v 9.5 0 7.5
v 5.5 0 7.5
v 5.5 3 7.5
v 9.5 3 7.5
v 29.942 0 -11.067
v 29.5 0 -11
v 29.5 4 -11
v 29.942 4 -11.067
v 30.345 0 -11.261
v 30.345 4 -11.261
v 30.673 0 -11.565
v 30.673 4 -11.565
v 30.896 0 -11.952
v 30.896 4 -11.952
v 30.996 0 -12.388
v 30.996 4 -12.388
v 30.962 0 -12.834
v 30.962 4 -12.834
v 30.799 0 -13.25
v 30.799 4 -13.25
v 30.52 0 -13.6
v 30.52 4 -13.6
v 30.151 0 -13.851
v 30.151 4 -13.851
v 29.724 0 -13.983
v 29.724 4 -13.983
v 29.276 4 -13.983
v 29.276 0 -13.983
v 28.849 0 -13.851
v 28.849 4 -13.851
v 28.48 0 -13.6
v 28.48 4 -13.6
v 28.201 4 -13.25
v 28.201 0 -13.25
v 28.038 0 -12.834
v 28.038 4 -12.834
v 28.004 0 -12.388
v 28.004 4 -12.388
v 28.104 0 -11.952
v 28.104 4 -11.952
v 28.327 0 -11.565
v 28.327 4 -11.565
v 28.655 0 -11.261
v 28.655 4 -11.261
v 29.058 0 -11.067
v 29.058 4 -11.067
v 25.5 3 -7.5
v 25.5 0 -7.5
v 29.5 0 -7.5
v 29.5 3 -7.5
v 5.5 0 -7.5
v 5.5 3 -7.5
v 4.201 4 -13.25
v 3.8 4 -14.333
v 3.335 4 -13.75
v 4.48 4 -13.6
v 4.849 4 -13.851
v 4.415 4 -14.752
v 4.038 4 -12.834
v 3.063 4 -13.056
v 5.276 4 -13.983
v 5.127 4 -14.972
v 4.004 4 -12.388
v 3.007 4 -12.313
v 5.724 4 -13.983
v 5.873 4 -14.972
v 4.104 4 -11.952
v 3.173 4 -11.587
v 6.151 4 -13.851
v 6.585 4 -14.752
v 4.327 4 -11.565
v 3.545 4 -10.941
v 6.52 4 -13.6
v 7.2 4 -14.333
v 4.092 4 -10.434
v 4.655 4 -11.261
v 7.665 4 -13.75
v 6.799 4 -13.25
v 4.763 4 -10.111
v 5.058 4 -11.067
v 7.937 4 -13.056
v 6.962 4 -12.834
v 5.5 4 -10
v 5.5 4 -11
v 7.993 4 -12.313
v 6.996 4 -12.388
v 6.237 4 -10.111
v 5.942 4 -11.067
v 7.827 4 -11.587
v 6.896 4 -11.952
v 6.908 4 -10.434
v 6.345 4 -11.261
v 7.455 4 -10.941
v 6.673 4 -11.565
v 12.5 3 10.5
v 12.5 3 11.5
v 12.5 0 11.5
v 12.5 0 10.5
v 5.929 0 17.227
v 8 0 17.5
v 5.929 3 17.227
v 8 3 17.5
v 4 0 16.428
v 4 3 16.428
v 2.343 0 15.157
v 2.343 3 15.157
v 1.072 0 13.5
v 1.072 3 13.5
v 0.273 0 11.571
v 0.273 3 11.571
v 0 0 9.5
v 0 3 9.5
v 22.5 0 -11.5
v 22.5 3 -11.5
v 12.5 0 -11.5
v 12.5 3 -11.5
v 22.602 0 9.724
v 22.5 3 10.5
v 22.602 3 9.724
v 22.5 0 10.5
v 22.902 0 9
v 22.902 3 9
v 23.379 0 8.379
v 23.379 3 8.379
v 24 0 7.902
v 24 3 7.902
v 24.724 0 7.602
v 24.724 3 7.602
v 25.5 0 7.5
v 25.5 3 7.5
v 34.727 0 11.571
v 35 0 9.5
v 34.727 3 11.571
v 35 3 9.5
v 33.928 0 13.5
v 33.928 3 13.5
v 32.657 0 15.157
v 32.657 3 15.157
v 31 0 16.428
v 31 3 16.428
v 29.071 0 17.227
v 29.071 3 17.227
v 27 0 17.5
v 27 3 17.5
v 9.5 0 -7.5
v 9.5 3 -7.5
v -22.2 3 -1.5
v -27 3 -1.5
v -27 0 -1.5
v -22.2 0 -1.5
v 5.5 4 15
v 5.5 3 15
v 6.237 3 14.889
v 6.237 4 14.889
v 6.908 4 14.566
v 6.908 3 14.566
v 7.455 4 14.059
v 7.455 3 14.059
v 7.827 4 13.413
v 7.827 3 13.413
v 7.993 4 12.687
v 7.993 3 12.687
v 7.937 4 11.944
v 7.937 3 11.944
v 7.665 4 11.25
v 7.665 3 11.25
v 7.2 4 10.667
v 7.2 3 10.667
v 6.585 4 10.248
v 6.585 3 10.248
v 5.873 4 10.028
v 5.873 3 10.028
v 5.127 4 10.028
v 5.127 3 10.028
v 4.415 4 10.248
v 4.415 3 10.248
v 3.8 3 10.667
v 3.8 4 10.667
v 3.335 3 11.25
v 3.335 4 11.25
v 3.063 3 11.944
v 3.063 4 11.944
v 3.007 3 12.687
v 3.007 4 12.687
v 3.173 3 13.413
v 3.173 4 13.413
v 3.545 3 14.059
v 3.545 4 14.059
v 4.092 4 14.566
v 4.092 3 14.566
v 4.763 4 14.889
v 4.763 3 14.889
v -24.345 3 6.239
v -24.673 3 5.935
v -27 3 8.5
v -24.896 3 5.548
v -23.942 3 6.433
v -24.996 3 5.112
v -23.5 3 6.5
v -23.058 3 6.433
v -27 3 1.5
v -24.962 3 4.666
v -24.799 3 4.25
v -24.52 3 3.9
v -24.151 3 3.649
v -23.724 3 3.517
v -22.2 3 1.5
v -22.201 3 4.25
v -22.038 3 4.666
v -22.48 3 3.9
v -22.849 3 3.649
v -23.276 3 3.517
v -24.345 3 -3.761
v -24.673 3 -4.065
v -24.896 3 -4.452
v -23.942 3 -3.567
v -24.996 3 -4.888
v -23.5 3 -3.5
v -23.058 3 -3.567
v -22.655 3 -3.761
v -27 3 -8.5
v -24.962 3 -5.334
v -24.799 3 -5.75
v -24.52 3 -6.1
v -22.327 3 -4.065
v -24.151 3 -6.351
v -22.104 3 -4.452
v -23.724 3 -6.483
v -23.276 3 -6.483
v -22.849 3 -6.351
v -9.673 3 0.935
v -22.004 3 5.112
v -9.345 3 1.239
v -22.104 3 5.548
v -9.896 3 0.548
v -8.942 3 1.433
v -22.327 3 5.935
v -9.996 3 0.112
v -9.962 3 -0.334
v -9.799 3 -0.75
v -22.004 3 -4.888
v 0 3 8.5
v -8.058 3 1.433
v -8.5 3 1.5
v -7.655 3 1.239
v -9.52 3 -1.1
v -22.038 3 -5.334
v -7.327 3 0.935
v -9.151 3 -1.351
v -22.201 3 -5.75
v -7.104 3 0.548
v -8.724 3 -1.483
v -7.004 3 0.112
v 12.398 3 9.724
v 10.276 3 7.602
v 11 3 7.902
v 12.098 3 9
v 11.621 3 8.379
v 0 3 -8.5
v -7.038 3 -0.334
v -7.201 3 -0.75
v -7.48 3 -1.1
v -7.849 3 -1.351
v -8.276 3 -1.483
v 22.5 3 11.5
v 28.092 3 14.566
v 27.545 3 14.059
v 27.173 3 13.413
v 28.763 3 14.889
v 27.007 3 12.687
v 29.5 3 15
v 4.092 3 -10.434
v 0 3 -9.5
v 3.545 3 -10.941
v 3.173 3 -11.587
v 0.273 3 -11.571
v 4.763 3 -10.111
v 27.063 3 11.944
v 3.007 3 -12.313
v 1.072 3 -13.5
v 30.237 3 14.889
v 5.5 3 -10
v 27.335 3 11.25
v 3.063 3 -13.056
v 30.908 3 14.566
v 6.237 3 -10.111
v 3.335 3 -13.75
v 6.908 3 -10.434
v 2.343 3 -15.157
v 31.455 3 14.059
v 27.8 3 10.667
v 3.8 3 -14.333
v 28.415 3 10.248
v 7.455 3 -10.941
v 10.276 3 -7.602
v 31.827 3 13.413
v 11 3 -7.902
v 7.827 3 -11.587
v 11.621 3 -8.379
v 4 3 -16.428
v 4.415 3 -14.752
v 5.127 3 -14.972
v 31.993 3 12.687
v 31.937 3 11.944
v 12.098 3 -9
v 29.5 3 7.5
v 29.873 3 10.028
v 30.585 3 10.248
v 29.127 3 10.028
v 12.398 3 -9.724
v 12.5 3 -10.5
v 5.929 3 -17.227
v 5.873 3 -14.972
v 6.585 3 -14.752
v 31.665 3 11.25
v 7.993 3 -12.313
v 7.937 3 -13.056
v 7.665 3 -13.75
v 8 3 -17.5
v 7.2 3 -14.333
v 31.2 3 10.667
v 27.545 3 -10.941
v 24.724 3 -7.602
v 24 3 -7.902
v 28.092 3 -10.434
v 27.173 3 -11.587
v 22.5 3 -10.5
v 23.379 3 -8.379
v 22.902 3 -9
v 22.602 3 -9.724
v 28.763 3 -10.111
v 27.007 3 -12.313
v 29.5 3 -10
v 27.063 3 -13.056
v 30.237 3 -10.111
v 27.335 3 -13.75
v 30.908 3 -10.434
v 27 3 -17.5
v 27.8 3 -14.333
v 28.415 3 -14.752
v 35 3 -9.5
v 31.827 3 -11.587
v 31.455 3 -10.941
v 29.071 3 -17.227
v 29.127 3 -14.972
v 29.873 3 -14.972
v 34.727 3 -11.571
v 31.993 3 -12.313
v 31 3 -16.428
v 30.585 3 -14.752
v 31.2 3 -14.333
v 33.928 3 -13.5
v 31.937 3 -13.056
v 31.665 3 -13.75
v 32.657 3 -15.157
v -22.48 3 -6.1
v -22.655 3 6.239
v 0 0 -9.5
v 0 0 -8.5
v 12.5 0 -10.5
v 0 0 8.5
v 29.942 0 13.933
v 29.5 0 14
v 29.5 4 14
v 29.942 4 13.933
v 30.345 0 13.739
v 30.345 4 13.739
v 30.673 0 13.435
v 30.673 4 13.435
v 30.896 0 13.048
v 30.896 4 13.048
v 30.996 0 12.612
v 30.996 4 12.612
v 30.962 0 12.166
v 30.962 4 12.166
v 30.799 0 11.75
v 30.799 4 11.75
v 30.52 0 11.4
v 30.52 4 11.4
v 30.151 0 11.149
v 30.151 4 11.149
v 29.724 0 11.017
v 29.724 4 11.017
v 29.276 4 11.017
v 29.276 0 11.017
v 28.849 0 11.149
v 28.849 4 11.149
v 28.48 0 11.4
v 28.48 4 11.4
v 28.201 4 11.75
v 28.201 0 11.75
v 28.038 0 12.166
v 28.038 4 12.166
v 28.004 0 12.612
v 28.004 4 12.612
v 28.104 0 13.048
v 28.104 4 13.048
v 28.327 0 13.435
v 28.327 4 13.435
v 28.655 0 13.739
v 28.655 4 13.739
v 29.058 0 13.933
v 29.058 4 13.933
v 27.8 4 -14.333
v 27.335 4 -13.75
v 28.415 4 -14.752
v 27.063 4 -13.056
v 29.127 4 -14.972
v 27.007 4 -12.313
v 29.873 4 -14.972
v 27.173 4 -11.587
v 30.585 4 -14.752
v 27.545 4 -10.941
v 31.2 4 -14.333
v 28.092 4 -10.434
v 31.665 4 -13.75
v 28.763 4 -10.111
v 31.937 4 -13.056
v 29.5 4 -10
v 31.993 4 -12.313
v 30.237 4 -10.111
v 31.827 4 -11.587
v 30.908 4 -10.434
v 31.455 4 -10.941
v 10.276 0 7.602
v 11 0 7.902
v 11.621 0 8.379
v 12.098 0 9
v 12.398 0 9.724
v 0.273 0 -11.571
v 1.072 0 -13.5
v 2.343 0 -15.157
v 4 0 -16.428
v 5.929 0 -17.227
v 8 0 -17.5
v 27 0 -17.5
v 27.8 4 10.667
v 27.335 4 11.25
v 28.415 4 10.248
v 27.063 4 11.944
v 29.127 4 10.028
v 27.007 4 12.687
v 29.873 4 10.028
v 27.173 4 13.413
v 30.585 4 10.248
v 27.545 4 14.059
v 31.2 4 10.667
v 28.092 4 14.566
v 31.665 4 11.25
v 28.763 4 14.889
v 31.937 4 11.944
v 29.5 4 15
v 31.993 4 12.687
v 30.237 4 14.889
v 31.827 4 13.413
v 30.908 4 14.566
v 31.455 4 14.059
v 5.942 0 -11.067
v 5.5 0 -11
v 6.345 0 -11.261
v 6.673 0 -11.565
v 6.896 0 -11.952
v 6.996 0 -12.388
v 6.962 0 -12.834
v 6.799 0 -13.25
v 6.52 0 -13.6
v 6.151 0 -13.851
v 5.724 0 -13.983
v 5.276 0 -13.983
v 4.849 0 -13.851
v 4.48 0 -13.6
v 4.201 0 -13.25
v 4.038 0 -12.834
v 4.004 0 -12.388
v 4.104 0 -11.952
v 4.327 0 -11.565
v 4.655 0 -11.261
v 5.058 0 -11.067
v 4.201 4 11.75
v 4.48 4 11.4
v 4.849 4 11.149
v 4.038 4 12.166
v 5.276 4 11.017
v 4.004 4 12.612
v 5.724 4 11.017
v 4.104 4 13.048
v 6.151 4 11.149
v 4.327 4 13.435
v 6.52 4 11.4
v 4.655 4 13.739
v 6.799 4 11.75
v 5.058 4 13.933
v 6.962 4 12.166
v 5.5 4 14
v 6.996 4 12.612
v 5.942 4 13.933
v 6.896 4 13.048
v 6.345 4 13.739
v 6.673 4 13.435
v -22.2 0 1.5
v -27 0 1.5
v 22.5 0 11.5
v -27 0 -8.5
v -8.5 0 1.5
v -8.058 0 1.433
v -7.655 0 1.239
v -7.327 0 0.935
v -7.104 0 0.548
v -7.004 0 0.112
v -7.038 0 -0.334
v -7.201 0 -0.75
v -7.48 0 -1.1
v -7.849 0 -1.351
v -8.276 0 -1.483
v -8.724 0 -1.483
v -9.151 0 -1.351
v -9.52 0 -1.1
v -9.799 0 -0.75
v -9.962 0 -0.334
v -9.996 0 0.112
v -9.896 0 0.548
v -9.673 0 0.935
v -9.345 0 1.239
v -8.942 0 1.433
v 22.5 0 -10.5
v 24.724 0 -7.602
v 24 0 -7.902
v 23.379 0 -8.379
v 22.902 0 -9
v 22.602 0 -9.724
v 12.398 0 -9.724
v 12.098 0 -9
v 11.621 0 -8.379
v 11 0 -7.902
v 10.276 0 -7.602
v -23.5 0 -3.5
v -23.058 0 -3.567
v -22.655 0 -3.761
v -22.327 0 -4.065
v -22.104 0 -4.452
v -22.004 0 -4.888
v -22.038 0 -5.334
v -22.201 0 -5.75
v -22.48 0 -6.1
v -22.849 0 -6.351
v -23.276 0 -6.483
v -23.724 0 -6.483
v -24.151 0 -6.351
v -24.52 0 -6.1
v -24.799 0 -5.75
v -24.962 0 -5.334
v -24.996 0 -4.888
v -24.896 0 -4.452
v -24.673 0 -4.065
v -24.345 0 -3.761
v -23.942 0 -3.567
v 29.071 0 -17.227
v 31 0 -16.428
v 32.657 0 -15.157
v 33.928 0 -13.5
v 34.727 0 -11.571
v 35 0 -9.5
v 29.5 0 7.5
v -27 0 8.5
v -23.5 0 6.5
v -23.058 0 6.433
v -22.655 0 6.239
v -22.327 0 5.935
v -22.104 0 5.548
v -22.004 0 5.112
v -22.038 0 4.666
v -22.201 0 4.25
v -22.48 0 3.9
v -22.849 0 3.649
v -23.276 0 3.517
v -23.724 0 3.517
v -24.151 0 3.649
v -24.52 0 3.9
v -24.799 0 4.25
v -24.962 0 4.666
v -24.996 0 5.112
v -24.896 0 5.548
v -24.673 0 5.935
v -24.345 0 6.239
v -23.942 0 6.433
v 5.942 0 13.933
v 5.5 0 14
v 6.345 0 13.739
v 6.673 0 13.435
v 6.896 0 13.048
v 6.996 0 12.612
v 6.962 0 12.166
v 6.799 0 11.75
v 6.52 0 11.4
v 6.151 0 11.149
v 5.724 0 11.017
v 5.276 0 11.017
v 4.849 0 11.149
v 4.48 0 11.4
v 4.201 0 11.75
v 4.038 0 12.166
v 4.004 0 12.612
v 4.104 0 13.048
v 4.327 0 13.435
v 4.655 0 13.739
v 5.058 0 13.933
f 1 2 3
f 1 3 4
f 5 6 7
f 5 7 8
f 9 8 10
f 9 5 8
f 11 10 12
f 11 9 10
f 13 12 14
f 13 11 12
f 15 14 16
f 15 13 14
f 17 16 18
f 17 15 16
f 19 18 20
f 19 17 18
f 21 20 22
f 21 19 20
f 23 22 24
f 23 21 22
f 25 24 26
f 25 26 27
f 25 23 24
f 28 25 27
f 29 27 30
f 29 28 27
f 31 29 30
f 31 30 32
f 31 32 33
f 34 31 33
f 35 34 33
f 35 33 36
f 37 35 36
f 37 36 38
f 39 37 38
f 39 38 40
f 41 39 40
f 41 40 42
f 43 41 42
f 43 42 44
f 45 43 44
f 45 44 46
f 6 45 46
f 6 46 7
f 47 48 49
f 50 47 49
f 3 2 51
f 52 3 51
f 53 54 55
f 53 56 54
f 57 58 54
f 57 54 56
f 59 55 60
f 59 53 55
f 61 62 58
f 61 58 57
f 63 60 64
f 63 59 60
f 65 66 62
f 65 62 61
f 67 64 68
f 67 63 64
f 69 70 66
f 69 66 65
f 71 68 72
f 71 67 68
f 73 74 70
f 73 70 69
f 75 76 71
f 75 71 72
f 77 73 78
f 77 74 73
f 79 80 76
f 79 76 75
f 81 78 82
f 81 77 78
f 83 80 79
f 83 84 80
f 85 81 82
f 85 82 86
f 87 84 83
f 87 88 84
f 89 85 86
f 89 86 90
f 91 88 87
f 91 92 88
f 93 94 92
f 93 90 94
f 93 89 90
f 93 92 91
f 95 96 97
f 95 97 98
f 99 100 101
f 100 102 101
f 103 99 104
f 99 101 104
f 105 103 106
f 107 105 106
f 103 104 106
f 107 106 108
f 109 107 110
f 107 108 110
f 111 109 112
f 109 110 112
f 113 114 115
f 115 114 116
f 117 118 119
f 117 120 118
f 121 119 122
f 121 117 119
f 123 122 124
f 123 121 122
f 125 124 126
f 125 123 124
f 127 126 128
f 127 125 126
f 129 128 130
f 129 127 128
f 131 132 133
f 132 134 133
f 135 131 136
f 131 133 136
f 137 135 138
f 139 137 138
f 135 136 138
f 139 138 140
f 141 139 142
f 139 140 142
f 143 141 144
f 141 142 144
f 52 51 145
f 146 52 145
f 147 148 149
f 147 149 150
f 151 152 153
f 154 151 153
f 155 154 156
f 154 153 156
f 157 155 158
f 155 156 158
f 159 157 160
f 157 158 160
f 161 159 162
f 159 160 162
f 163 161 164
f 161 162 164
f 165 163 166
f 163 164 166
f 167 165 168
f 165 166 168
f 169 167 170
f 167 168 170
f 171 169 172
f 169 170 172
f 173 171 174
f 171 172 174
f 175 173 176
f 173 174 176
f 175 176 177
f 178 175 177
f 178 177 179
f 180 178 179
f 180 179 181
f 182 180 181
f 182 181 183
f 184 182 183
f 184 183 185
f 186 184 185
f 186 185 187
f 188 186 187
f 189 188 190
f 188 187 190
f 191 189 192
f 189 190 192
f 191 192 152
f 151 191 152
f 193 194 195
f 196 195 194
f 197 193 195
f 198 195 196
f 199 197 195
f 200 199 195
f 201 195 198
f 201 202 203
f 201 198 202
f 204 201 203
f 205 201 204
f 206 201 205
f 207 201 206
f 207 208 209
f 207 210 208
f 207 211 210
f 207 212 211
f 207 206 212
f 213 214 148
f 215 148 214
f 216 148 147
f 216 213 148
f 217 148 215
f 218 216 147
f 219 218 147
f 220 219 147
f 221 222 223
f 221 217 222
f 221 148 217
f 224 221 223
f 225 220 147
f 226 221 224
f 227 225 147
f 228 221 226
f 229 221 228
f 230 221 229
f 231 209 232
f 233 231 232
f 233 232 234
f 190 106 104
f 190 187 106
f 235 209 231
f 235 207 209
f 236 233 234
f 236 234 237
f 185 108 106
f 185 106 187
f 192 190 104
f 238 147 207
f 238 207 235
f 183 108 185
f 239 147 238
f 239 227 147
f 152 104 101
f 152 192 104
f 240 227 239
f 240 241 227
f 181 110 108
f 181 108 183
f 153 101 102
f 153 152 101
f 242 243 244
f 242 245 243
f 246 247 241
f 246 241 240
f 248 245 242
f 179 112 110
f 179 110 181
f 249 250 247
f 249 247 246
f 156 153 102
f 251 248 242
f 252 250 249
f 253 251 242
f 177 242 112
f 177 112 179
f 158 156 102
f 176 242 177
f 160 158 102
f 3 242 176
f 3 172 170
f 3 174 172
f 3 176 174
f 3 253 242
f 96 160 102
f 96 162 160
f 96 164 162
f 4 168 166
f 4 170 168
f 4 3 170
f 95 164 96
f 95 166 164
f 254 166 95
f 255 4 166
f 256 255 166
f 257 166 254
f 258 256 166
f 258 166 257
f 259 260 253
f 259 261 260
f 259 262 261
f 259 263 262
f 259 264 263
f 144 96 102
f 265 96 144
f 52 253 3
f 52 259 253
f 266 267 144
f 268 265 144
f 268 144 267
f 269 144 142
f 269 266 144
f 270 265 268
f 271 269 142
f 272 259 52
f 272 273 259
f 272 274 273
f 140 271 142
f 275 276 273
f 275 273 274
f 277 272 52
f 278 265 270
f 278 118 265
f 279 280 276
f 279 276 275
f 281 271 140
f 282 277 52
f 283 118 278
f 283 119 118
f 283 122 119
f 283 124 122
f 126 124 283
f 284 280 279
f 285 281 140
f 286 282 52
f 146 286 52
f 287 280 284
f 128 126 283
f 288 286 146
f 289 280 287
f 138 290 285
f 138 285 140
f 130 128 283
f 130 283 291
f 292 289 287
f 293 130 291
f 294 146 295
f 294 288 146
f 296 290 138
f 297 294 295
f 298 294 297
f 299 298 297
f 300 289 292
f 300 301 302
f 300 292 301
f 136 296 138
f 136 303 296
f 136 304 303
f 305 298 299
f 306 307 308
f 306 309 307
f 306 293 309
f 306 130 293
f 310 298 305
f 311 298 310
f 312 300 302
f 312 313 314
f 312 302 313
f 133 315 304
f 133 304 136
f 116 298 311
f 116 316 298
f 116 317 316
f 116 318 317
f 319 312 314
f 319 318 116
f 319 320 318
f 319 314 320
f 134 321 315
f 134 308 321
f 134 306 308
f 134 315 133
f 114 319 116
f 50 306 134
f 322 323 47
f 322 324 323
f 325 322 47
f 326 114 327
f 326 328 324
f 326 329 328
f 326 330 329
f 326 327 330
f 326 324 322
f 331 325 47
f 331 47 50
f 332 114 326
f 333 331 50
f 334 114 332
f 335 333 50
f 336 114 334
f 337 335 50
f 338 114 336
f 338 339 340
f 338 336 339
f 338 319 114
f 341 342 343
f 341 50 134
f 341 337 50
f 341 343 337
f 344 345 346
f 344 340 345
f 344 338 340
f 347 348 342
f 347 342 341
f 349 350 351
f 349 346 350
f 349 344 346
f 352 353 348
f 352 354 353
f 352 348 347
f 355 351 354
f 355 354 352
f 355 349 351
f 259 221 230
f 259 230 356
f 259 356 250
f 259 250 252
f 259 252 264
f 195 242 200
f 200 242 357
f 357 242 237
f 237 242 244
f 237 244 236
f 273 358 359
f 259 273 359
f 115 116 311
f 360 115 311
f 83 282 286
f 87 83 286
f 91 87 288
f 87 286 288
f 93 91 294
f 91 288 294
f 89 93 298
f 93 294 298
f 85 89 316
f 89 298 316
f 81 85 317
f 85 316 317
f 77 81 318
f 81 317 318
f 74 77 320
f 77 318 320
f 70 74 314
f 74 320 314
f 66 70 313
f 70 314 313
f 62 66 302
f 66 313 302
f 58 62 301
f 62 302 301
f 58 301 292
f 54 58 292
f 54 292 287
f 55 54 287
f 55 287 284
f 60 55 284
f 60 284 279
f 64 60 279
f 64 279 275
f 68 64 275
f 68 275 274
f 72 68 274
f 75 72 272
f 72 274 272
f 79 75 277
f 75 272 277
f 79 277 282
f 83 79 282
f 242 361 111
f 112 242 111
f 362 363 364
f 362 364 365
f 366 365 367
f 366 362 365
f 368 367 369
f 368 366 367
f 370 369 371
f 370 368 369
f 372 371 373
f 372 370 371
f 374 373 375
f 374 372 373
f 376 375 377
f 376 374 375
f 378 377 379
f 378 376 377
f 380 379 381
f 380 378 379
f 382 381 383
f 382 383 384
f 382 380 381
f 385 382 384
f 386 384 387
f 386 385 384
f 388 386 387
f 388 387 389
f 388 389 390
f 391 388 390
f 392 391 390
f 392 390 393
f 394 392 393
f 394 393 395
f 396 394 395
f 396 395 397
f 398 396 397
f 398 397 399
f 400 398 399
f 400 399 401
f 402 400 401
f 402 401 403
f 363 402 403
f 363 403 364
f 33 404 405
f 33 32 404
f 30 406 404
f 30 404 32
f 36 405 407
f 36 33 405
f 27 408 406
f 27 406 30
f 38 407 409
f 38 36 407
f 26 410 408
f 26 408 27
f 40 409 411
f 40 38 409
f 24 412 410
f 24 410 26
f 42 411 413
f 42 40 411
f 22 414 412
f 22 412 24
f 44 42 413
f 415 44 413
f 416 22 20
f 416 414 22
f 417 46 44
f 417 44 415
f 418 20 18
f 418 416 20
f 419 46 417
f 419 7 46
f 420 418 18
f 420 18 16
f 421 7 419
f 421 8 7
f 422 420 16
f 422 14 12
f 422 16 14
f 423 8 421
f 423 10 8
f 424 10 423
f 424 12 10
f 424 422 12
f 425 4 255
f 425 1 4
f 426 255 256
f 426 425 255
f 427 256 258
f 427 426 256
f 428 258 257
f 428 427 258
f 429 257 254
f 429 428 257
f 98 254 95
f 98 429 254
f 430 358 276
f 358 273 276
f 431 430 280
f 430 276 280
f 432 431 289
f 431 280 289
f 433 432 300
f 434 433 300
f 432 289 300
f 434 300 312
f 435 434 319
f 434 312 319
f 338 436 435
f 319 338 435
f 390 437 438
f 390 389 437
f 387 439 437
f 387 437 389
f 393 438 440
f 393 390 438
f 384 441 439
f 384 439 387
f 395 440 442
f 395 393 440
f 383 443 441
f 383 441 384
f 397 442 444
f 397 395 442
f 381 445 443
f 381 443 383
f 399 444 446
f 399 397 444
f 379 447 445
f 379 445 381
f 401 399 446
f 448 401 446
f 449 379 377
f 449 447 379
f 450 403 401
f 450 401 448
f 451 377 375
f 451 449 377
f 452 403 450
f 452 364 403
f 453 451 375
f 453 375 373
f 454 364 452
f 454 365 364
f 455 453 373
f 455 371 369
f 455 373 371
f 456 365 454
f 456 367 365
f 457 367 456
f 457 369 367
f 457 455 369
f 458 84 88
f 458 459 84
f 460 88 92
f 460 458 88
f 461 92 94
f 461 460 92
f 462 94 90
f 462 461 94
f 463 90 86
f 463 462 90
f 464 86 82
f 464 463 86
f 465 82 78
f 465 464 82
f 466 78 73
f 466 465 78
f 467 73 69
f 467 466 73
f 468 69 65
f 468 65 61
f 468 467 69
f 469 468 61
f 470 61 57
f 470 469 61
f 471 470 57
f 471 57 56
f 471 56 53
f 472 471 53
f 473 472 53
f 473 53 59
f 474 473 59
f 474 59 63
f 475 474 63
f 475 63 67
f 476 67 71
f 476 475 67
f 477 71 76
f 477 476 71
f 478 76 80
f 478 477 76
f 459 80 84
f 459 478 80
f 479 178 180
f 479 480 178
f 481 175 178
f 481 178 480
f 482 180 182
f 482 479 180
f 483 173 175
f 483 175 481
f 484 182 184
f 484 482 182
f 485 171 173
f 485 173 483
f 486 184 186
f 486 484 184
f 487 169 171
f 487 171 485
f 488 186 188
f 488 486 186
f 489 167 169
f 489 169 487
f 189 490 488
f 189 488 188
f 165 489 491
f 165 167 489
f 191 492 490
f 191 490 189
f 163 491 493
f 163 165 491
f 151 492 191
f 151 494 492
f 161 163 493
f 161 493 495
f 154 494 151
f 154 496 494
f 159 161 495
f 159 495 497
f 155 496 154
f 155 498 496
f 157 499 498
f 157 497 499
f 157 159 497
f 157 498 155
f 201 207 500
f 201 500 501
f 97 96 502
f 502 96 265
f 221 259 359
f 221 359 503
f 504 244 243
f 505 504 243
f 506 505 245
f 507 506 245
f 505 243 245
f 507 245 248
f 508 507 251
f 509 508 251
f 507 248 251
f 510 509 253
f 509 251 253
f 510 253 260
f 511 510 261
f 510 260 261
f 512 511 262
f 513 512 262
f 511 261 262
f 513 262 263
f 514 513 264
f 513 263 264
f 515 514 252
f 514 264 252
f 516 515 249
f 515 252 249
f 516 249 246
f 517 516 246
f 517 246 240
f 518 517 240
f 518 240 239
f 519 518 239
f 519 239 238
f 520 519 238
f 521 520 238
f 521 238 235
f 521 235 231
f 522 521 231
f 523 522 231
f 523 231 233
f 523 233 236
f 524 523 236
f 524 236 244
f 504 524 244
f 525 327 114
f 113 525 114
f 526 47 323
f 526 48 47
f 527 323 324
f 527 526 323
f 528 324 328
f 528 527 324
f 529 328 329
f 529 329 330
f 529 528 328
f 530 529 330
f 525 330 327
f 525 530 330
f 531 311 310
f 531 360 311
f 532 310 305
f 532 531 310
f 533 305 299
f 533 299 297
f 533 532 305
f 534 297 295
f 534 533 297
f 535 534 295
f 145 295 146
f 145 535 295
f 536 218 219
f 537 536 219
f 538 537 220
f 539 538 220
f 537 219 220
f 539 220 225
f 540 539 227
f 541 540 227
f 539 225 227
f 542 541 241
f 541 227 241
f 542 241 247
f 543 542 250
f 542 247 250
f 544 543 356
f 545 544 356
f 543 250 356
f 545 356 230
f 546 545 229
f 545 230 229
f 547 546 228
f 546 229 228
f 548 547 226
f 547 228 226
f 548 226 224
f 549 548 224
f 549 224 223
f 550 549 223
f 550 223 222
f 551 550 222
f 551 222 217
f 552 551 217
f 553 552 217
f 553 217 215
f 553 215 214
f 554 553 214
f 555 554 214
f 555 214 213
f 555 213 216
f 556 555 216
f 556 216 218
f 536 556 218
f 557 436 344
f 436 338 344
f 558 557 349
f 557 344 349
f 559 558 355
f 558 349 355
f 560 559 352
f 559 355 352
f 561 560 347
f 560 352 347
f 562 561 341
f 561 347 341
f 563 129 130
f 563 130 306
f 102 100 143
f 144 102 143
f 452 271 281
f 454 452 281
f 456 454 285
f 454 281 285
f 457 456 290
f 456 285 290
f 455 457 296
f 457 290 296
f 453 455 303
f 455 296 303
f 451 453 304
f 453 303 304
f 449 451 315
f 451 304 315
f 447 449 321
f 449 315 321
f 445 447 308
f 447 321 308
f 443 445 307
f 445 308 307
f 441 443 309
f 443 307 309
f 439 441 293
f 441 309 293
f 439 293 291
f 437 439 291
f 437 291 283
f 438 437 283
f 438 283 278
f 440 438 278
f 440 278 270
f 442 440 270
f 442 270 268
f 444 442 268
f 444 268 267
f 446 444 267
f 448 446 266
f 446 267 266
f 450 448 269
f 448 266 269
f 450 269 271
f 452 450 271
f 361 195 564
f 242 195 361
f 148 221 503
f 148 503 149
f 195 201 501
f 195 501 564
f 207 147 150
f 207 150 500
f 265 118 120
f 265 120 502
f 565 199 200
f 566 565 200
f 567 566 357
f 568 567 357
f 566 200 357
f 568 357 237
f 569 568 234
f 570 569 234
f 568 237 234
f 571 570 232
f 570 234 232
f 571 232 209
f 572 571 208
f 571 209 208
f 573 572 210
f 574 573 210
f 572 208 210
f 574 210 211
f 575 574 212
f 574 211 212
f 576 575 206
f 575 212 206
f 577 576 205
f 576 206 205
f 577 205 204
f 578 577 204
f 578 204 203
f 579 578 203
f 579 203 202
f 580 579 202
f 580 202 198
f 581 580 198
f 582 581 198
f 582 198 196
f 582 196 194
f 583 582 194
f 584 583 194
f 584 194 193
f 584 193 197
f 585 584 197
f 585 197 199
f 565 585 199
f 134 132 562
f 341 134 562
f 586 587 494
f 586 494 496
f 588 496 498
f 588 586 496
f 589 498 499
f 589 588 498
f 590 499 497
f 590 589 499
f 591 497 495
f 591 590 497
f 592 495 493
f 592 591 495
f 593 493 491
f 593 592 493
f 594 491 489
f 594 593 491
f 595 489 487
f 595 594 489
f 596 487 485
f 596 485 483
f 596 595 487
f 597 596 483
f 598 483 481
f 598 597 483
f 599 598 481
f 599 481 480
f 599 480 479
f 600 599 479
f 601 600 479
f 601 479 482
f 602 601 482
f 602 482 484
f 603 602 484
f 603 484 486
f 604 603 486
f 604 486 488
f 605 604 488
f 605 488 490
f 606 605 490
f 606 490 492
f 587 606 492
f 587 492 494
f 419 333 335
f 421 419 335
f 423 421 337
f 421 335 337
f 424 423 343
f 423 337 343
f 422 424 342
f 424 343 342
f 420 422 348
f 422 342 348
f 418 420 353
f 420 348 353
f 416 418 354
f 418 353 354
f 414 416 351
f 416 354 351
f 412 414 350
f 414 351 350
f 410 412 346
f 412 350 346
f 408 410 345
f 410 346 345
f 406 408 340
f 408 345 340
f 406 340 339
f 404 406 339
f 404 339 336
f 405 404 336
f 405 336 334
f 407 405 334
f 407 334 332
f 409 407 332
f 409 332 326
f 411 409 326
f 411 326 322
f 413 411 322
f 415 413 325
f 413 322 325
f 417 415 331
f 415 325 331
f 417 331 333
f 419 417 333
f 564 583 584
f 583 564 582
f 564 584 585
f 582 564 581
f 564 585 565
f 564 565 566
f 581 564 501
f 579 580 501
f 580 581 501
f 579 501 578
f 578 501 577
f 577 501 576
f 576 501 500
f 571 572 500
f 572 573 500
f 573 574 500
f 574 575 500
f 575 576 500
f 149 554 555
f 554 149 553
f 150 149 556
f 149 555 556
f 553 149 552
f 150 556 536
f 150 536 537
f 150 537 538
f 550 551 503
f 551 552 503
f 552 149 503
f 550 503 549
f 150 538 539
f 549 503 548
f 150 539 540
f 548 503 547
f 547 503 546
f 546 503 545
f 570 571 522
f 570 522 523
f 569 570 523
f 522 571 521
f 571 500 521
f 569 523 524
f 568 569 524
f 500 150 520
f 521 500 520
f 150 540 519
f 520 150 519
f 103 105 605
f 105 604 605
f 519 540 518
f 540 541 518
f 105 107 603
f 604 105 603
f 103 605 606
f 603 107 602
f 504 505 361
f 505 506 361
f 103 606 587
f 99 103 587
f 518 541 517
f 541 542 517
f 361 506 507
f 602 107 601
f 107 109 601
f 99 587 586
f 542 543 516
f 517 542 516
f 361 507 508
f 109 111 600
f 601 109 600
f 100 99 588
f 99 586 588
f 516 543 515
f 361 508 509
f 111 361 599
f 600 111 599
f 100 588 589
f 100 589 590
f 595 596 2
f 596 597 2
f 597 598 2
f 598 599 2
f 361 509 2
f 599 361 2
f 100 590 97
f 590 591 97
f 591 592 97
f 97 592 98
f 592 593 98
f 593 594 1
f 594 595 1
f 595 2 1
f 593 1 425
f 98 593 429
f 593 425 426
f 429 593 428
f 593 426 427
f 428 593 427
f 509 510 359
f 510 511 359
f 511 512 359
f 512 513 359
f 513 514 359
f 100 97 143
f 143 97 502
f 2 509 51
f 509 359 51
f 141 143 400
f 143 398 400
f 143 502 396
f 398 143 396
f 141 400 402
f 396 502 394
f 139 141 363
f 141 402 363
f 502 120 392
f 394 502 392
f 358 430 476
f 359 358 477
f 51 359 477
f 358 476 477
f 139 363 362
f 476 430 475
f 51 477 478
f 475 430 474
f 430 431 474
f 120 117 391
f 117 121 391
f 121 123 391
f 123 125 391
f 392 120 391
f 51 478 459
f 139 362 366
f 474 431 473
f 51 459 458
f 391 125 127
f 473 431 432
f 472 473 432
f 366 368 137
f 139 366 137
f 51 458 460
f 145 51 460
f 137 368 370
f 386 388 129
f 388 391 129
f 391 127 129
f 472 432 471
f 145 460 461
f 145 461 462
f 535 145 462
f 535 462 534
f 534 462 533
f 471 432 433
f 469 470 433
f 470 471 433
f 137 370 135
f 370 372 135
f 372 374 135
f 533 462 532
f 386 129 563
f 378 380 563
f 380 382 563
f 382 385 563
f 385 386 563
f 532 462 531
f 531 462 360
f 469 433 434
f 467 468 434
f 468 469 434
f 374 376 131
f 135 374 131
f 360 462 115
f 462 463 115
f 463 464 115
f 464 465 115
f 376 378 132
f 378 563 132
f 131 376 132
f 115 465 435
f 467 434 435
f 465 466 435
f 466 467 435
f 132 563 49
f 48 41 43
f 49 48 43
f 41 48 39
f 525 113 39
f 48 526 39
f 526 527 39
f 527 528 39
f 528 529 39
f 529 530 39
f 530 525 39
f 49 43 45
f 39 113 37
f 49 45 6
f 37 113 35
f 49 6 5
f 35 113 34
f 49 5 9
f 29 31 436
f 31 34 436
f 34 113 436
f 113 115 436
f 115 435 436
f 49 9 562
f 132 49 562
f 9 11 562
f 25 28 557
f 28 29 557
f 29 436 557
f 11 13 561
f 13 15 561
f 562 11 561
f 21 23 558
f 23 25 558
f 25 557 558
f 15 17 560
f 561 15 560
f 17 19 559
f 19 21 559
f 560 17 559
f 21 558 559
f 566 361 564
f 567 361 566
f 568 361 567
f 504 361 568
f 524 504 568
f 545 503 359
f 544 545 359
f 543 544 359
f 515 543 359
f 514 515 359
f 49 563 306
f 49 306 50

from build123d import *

# Parameters (mm, degrees)
SKETCH_1_R          = 1.5
SKETCH_1_W          = 24
SKETCH_1_H          = 15
EXTRUDE_1_DEPTH     = 3
SKETCH_2_R          = 2.5
SKETCH_2_R_2        = 1.5
EXTRUDE_2_DEPTH     = 1
CUT_EXTRUDE_1_REACH = 41.246
SKETCH_3_W          = 7
SKETCH_3_H          = 3
FILLET_1_R          = 8
EXTRUDE_3_DEPTH     = 3
CUT_EXTRUDE_2_REACH = 41.246
SKETCH_5_R          = 1.5
EXTRUDE_START       = -3
SKETCH_6_R          = 1.5
EXTRUDE_4_DEPTH     = 3
CUT_EXTRUDE_3_DEPTH = 40.246018906
FILLET_2_R          = 3


with BuildPart() as part:
    # 草图1 → 凸台-拉伸1 (new body)
    with BuildSketch(Plane(origin=(0, 0, 0), x_dir=(1, 0, 0), z_dir=(0, 1, 0))):
        Polygon((-14, -8.5), (0, -8.5), (0, -17.5), (35, -17.5), (35, 17.5), (0, 17.5), (0, 8.5), (-14, 8.5), (-21, 8.5), (-21, -8.5), align=None)
        with Locations(Location((-2.5, 0, 0), (0, 0, 270))):
            Circle(SKETCH_1_R, mode=Mode.SUBTRACT)
        with Locations(Location((29.5, -12.5, 0), (0, 0, 270))):
            Circle(SKETCH_1_R, mode=Mode.SUBTRACT)
        with Locations(Location((5.5, -12.5, 0), (0, 0, 270))):
            Circle(SKETCH_1_R, mode=Mode.SUBTRACT)
        with Locations(Location((29.5, 12.5, 0), (0, 0, 270))):
            Circle(SKETCH_1_R, mode=Mode.SUBTRACT)
        with Locations(Location((5.5, 12.5, 0), (0, 0, 270))):
            Circle(SKETCH_1_R, mode=Mode.SUBTRACT)
        with Locations(Location((-17.5, -5, 0), (0, 0, 270))):
            Circle(SKETCH_1_R, mode=Mode.SUBTRACT)
        with Locations(Location((-17.5, 5, 0), (0, 0, 270))):
            Circle(SKETCH_1_R, mode=Mode.SUBTRACT)
        with Locations((17.5, 0)):
            Rectangle(SKETCH_1_W, SKETCH_1_H, mode=Mode.SUBTRACT)
    extrude(amount=EXTRUDE_1_DEPTH)

    # 草图2 → 凸台-拉伸2 (add)
    # profile 1 of 4: a face of its own
    with BuildSketch(Plane(origin=(0, 3, 0), x_dir=(1, 0, 0), z_dir=(0, 1, 0))):
        with Locations(Location((5.5, 12.5, 0), (0, 0, 270))):
            Circle(SKETCH_2_R)
        with Locations(Location((5.5, 12.5, 0), (0, 0, 270))):
            Circle(SKETCH_2_R_2, mode=Mode.SUBTRACT)
    # profile 2 of 4: a face of its own
    with BuildSketch(Plane(origin=(0, 3, 0), x_dir=(1, 0, 0), z_dir=(0, 1, 0))):
        with Locations(Location((29.5, 12.5, 0), (0, 0, 270))):
            Circle(SKETCH_2_R)
        with Locations(Location((29.5, 12.5, 0), (0, 0, 270))):
            Circle(SKETCH_2_R_2, mode=Mode.SUBTRACT)
    # profile 3 of 4: a face of its own
    with BuildSketch(Plane(origin=(0, 3, 0), x_dir=(1, 0, 0), z_dir=(0, 1, 0))):
        with Locations(Location((29.5, -12.5, 0), (0, 0, 270))):
            Circle(SKETCH_2_R)
        with Locations(Location((29.5, -12.5, 0), (0, 0, 270))):
            Circle(SKETCH_2_R_2, mode=Mode.SUBTRACT)
    # profile 4 of 4: a face of its own
    with BuildSketch(Plane(origin=(0, 3, 0), x_dir=(1, 0, 0), z_dir=(0, 1, 0))):
        with Locations(Location((5.5, -12.5, 0), (0, 0, 270))):
            Circle(SKETCH_2_R)
        with Locations(Location((5.5, -12.5, 0), (0, 0, 270))):
            Circle(SKETCH_2_R_2, mode=Mode.SUBTRACT)
    extrude(amount=EXTRUDE_2_DEPTH)

    # 草图3 → 切除-拉伸1 (cut, up to next)
    with BuildSketch(Plane(origin=(0, 3, 0), x_dir=(1, 0, 0), z_dir=(0, 1, 0)), mode=Mode.PRIVATE) as cut_extrude_1_sk1:
        with Locations((-17.5, 0)):
            Rectangle(SKETCH_3_W, SKETCH_3_H)
    cut_extrude_1_tool1 = extrude(cut_extrude_1_sk1.sketch, amount=-CUT_EXTRUDE_1_REACH, mode=Mode.PRIVATE) & part.part
    add(cut_extrude_1_tool1.solids().sort_by_distance((-17.5, 3, 0))[0], mode=Mode.SUBTRACT)

    # 圆角1
    fillet_1_edges = [part.edges().sort_by_distance(p)[0] for p in [
        (0, 1.5, -17.5),
        (35, 1.5, -17.5),
        (35, 1.5, 17.5),
        (0, 1.5, 17.5),
    ]]
    fillet(fillet_1_edges, radius=FILLET_1_R)

    # 草图4 → 凸台-拉伸3 (add)
    with BuildSketch(Plane(origin=(0, 3, 0), x_dir=(1, 0, 0), z_dir=(0, 1, 0))):
        Polygon((-21, 8.5), (-27, 8.5), (-27, 1.5), (-22.2, 1.5), (-22.2, -1.5), (-27, -1.5), (-27, -8.5), (-21, -8.5), (-21, -1.5), (-14, -1.5), (-14, 1.5), (-21, 1.5), align=None)
    extrude(amount=-EXTRUDE_3_DEPTH)

    # 草图5 → 切除-拉伸2 (cut, up to next)
    with BuildSketch(Plane(origin=(0, 3, 0), x_dir=(1, 0, 0), z_dir=(0, 1, 0)), mode=Mode.PRIVATE) as cut_extrude_2_sk1:
        with Locations(Location((-23.5, 5, 0), (0, 0, 270))):
            Circle(SKETCH_5_R)
    cut_extrude_2_tool1 = extrude(cut_extrude_2_sk1.sketch, amount=-CUT_EXTRUDE_2_REACH, mode=Mode.PRIVATE) & part.part
    # 草图5 → 切除-拉伸2 (cut, up to next)
    with BuildSketch(Plane(origin=(0, 3, 0), x_dir=(1, 0, 0), z_dir=(0, 1, 0)), mode=Mode.PRIVATE) as cut_extrude_2_sk2:
        with Locations(Location((-23.5, -5, 0), (0, 0, 270))):
            Circle(SKETCH_5_R)
    cut_extrude_2_tool2 = extrude(cut_extrude_2_sk2.sketch, amount=-CUT_EXTRUDE_2_REACH, mode=Mode.PRIVATE) & part.part
    # 草图5 → 切除-拉伸2 (cut, up to next)
    with BuildSketch(Plane(origin=(0, 3, 0), x_dir=(1, 0, 0), z_dir=(0, 1, 0)), mode=Mode.PRIVATE) as cut_extrude_2_sk3:
        with Locations(Location((-8.5, 0, 0), (0, 0, 270))):
            Circle(SKETCH_5_R)
    cut_extrude_2_tool3 = extrude(cut_extrude_2_sk3.sketch, amount=-CUT_EXTRUDE_2_REACH, mode=Mode.PRIVATE) & part.part
    add(cut_extrude_2_tool1.solids().sort_by_distance((-23.5, 3, -5))[0], mode=Mode.SUBTRACT)
    add(cut_extrude_2_tool2.solids().sort_by_distance((-23.5, 3, 5))[0], mode=Mode.SUBTRACT)
    add(cut_extrude_2_tool3.solids().sort_by_distance((-8.5, 3, 0))[0], mode=Mode.SUBTRACT)

    # 草图6 → 凸台-拉伸4 (add)
    with BuildSketch(Plane(origin=(0, 3, 0), x_dir=(1, 0, 0), z_dir=(0, 1, 0)).offset(EXTRUDE_START)):
        with Locations((-17.5, 5)):
            Circle(SKETCH_6_R)
        with Locations((-2.5, 0)):
            Circle(SKETCH_6_R)
        with Locations((-17.5, -5)):
            Circle(SKETCH_6_R)
    extrude(amount=EXTRUDE_4_DEPTH)

    # 草图7 → 切除-拉伸3 (cut, through all)
    with BuildSketch(Plane(origin=(0, 3, 0), x_dir=(1, 0, 0), z_dir=(0, 1, 0))):
        Polygon((17.5, 11.5), (12.5, 11.5), (12.5, 7.5), (22.5, 7.5), (22.5, 11.5), align=None)
        Polygon((22.5, -11.5), (17.5, -11.5), (12.5, -11.5), (12.5, -7.5), (22.5, -7.5), align=None)
    extrude(amount=-CUT_EXTRUDE_3_DEPTH, mode=Mode.SUBTRACT)

    # 圆角2
    fillet_2_edges = [part.edges().sort_by_distance(p)[0] for p in [
        (22.5, 1.5, -7.5),
        (12.5, 1.5, -7.5),
        (22.5, 1.5, 7.5),
        (12.5, 1.5, 7.5),
    ]]
    fillet(fillet_2_edges, radius=FILLET_2_R)


solid = part.part
